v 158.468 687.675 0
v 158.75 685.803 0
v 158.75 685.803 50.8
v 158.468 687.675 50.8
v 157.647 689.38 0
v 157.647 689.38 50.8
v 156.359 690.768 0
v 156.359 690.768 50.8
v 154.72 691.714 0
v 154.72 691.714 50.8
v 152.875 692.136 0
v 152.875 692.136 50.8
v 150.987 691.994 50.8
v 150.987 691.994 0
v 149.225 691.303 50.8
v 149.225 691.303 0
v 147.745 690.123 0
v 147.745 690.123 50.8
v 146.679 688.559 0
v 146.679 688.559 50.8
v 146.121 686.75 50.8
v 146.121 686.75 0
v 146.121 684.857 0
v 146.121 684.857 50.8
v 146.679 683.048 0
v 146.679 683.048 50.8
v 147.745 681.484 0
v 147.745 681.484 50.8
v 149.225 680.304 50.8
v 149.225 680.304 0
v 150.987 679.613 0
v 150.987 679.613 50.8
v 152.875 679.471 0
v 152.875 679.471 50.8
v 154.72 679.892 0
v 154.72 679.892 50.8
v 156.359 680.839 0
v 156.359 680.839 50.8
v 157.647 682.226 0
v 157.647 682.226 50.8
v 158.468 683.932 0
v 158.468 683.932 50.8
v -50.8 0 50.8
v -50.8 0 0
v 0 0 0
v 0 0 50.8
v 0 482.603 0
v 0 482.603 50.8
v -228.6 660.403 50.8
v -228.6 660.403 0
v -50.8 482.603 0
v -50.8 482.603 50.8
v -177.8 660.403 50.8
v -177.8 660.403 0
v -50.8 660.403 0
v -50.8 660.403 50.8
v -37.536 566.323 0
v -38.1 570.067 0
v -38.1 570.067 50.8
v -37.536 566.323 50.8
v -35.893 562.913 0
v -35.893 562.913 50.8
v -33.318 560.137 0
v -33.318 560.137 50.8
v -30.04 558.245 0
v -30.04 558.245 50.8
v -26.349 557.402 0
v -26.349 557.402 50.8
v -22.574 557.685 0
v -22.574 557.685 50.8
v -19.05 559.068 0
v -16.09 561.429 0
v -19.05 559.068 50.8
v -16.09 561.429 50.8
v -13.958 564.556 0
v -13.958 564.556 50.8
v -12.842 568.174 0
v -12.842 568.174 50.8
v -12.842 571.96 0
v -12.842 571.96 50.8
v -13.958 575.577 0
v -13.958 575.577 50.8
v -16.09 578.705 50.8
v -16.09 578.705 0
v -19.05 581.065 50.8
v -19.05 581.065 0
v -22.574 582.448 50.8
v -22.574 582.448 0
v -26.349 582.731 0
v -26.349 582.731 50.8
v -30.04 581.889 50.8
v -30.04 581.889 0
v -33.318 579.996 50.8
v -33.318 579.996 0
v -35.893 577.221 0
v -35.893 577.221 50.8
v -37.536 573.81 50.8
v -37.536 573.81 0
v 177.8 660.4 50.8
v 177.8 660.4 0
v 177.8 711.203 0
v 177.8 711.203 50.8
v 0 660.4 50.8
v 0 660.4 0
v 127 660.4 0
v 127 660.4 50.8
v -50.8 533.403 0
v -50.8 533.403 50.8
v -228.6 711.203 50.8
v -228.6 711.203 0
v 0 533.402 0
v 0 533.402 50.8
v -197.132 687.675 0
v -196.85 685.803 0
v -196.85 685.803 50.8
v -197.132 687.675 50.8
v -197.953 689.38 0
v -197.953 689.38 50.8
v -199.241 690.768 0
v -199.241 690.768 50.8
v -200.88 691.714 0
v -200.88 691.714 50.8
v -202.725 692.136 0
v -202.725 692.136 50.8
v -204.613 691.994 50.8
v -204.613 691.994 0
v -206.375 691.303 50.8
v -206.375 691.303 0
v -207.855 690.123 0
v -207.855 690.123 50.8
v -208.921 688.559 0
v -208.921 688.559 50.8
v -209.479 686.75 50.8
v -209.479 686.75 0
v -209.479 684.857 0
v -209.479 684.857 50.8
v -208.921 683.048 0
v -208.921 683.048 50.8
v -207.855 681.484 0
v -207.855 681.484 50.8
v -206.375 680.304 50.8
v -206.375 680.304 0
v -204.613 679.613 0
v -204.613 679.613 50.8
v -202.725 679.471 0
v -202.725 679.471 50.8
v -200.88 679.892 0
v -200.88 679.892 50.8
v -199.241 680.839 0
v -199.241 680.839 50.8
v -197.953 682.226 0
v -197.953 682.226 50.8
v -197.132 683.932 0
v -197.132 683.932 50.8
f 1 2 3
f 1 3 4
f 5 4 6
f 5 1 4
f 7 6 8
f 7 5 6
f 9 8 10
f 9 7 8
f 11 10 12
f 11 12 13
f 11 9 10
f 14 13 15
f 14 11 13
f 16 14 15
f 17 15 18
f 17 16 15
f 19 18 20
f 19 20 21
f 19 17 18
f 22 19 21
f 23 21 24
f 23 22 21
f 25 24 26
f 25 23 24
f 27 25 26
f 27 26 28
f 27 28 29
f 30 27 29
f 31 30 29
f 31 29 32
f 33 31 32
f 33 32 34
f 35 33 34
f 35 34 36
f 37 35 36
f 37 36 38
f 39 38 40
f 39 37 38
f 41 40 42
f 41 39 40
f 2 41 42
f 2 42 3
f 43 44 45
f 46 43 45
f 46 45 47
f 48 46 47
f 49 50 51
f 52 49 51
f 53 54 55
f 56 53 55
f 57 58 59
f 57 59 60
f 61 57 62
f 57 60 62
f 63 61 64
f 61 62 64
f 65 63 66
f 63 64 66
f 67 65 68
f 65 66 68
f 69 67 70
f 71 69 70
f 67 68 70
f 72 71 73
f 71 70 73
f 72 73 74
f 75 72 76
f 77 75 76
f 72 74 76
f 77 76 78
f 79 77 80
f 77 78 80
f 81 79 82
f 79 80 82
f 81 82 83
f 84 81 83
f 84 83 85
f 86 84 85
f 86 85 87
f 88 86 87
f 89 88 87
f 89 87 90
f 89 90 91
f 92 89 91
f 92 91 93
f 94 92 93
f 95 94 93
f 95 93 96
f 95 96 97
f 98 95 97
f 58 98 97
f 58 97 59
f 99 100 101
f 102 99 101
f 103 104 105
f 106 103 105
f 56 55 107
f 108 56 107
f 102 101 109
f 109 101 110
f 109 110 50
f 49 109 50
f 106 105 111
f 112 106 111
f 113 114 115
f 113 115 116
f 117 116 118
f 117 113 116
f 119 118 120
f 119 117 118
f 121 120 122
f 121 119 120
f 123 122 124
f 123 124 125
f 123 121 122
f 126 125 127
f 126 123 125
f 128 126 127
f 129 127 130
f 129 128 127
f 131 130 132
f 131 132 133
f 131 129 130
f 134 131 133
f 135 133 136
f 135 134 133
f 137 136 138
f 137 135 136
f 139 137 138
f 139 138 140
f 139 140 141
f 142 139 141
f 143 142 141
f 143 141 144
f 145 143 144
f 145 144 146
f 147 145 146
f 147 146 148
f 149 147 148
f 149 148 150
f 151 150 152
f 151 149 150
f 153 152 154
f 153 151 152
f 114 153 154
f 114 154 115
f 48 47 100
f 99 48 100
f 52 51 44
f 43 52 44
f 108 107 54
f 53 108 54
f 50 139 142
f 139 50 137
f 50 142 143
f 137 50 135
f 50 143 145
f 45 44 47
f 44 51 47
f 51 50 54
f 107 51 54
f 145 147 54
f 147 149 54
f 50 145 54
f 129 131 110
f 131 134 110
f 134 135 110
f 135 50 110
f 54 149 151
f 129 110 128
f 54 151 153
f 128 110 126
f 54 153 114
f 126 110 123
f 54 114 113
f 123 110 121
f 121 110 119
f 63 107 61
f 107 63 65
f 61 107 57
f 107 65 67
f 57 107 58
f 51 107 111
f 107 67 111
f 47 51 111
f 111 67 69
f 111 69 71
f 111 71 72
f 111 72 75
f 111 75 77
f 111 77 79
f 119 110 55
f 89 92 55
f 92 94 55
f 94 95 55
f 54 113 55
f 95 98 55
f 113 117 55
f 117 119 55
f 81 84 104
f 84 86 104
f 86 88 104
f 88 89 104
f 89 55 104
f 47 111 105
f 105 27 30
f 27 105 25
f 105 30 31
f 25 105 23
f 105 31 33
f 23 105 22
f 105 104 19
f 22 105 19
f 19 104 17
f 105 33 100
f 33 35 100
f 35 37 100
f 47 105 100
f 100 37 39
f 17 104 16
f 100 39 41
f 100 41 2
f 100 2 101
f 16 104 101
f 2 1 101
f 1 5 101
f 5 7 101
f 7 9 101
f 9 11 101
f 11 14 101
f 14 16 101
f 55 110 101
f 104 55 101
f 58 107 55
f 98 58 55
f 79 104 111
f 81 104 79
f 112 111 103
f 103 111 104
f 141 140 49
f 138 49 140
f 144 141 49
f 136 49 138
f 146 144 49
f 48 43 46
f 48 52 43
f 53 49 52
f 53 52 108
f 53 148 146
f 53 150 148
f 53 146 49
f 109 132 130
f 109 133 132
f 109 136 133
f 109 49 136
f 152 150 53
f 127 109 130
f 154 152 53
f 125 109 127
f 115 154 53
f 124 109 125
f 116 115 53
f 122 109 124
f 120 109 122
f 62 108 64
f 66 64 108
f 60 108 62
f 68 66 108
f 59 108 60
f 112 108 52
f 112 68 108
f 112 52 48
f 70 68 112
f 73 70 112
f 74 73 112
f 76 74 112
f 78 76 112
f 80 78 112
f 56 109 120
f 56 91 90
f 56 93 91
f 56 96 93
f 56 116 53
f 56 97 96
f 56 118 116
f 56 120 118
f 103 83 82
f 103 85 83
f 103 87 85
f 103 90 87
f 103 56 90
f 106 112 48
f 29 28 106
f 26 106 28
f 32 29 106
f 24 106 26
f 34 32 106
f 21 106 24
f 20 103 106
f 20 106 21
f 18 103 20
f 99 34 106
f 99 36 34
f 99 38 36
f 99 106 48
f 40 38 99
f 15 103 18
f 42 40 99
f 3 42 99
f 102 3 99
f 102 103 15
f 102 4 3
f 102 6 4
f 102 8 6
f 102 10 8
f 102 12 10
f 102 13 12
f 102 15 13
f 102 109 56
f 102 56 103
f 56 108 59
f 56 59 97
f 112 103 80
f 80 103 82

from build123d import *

# Parameters (mm, degrees)
F0_R     = 6.35
F1_DEPTH = 50.8
F3_D     = 25.4


with BuildPart() as f1:
    # F0 (on Top) → F1 (new body)
    with BuildSketch(Plane.XY):
        Polygon((-50.8, 0), (0, 0), (0, 482.6034102367), (177.8, 660.4), (177.8, 711.2034102367), (0, 711.2034102367), (-50.8, 711.2034102367), (-228.6, 711.2034102367), (-228.6, 660.4034102367), (-50.8, 482.6034102367), align=None)
        with Locations((-203.2, 685.8034102367)):
            Circle(F0_R, mode=Mode.SUBTRACT)
        Polygon((-50.8, 533.4034102367), (-177.8, 660.4034102367), (-50.8, 660.4034102367), align=None, mode=Mode.SUBTRACT)
        Polygon((0, 660.4), (127, 660.4), (0, 533.4024358834), align=None, mode=Mode.SUBTRACT)
        with Locations((152.4, 685.8034102367)):
            Circle(F0_R, mode=Mode.SUBTRACT)
    extrude(amount=F1_DEPTH)

    # F3 (through all)
    with Locations(Plane(origin=(0, 0, 0), x_dir=(1, 0, 0), z_dir=(0, 0, -1))):
        with Locations((-25.4, -570.0667500496)):
            Hole(F3_D / 2)


solid = f1.part
